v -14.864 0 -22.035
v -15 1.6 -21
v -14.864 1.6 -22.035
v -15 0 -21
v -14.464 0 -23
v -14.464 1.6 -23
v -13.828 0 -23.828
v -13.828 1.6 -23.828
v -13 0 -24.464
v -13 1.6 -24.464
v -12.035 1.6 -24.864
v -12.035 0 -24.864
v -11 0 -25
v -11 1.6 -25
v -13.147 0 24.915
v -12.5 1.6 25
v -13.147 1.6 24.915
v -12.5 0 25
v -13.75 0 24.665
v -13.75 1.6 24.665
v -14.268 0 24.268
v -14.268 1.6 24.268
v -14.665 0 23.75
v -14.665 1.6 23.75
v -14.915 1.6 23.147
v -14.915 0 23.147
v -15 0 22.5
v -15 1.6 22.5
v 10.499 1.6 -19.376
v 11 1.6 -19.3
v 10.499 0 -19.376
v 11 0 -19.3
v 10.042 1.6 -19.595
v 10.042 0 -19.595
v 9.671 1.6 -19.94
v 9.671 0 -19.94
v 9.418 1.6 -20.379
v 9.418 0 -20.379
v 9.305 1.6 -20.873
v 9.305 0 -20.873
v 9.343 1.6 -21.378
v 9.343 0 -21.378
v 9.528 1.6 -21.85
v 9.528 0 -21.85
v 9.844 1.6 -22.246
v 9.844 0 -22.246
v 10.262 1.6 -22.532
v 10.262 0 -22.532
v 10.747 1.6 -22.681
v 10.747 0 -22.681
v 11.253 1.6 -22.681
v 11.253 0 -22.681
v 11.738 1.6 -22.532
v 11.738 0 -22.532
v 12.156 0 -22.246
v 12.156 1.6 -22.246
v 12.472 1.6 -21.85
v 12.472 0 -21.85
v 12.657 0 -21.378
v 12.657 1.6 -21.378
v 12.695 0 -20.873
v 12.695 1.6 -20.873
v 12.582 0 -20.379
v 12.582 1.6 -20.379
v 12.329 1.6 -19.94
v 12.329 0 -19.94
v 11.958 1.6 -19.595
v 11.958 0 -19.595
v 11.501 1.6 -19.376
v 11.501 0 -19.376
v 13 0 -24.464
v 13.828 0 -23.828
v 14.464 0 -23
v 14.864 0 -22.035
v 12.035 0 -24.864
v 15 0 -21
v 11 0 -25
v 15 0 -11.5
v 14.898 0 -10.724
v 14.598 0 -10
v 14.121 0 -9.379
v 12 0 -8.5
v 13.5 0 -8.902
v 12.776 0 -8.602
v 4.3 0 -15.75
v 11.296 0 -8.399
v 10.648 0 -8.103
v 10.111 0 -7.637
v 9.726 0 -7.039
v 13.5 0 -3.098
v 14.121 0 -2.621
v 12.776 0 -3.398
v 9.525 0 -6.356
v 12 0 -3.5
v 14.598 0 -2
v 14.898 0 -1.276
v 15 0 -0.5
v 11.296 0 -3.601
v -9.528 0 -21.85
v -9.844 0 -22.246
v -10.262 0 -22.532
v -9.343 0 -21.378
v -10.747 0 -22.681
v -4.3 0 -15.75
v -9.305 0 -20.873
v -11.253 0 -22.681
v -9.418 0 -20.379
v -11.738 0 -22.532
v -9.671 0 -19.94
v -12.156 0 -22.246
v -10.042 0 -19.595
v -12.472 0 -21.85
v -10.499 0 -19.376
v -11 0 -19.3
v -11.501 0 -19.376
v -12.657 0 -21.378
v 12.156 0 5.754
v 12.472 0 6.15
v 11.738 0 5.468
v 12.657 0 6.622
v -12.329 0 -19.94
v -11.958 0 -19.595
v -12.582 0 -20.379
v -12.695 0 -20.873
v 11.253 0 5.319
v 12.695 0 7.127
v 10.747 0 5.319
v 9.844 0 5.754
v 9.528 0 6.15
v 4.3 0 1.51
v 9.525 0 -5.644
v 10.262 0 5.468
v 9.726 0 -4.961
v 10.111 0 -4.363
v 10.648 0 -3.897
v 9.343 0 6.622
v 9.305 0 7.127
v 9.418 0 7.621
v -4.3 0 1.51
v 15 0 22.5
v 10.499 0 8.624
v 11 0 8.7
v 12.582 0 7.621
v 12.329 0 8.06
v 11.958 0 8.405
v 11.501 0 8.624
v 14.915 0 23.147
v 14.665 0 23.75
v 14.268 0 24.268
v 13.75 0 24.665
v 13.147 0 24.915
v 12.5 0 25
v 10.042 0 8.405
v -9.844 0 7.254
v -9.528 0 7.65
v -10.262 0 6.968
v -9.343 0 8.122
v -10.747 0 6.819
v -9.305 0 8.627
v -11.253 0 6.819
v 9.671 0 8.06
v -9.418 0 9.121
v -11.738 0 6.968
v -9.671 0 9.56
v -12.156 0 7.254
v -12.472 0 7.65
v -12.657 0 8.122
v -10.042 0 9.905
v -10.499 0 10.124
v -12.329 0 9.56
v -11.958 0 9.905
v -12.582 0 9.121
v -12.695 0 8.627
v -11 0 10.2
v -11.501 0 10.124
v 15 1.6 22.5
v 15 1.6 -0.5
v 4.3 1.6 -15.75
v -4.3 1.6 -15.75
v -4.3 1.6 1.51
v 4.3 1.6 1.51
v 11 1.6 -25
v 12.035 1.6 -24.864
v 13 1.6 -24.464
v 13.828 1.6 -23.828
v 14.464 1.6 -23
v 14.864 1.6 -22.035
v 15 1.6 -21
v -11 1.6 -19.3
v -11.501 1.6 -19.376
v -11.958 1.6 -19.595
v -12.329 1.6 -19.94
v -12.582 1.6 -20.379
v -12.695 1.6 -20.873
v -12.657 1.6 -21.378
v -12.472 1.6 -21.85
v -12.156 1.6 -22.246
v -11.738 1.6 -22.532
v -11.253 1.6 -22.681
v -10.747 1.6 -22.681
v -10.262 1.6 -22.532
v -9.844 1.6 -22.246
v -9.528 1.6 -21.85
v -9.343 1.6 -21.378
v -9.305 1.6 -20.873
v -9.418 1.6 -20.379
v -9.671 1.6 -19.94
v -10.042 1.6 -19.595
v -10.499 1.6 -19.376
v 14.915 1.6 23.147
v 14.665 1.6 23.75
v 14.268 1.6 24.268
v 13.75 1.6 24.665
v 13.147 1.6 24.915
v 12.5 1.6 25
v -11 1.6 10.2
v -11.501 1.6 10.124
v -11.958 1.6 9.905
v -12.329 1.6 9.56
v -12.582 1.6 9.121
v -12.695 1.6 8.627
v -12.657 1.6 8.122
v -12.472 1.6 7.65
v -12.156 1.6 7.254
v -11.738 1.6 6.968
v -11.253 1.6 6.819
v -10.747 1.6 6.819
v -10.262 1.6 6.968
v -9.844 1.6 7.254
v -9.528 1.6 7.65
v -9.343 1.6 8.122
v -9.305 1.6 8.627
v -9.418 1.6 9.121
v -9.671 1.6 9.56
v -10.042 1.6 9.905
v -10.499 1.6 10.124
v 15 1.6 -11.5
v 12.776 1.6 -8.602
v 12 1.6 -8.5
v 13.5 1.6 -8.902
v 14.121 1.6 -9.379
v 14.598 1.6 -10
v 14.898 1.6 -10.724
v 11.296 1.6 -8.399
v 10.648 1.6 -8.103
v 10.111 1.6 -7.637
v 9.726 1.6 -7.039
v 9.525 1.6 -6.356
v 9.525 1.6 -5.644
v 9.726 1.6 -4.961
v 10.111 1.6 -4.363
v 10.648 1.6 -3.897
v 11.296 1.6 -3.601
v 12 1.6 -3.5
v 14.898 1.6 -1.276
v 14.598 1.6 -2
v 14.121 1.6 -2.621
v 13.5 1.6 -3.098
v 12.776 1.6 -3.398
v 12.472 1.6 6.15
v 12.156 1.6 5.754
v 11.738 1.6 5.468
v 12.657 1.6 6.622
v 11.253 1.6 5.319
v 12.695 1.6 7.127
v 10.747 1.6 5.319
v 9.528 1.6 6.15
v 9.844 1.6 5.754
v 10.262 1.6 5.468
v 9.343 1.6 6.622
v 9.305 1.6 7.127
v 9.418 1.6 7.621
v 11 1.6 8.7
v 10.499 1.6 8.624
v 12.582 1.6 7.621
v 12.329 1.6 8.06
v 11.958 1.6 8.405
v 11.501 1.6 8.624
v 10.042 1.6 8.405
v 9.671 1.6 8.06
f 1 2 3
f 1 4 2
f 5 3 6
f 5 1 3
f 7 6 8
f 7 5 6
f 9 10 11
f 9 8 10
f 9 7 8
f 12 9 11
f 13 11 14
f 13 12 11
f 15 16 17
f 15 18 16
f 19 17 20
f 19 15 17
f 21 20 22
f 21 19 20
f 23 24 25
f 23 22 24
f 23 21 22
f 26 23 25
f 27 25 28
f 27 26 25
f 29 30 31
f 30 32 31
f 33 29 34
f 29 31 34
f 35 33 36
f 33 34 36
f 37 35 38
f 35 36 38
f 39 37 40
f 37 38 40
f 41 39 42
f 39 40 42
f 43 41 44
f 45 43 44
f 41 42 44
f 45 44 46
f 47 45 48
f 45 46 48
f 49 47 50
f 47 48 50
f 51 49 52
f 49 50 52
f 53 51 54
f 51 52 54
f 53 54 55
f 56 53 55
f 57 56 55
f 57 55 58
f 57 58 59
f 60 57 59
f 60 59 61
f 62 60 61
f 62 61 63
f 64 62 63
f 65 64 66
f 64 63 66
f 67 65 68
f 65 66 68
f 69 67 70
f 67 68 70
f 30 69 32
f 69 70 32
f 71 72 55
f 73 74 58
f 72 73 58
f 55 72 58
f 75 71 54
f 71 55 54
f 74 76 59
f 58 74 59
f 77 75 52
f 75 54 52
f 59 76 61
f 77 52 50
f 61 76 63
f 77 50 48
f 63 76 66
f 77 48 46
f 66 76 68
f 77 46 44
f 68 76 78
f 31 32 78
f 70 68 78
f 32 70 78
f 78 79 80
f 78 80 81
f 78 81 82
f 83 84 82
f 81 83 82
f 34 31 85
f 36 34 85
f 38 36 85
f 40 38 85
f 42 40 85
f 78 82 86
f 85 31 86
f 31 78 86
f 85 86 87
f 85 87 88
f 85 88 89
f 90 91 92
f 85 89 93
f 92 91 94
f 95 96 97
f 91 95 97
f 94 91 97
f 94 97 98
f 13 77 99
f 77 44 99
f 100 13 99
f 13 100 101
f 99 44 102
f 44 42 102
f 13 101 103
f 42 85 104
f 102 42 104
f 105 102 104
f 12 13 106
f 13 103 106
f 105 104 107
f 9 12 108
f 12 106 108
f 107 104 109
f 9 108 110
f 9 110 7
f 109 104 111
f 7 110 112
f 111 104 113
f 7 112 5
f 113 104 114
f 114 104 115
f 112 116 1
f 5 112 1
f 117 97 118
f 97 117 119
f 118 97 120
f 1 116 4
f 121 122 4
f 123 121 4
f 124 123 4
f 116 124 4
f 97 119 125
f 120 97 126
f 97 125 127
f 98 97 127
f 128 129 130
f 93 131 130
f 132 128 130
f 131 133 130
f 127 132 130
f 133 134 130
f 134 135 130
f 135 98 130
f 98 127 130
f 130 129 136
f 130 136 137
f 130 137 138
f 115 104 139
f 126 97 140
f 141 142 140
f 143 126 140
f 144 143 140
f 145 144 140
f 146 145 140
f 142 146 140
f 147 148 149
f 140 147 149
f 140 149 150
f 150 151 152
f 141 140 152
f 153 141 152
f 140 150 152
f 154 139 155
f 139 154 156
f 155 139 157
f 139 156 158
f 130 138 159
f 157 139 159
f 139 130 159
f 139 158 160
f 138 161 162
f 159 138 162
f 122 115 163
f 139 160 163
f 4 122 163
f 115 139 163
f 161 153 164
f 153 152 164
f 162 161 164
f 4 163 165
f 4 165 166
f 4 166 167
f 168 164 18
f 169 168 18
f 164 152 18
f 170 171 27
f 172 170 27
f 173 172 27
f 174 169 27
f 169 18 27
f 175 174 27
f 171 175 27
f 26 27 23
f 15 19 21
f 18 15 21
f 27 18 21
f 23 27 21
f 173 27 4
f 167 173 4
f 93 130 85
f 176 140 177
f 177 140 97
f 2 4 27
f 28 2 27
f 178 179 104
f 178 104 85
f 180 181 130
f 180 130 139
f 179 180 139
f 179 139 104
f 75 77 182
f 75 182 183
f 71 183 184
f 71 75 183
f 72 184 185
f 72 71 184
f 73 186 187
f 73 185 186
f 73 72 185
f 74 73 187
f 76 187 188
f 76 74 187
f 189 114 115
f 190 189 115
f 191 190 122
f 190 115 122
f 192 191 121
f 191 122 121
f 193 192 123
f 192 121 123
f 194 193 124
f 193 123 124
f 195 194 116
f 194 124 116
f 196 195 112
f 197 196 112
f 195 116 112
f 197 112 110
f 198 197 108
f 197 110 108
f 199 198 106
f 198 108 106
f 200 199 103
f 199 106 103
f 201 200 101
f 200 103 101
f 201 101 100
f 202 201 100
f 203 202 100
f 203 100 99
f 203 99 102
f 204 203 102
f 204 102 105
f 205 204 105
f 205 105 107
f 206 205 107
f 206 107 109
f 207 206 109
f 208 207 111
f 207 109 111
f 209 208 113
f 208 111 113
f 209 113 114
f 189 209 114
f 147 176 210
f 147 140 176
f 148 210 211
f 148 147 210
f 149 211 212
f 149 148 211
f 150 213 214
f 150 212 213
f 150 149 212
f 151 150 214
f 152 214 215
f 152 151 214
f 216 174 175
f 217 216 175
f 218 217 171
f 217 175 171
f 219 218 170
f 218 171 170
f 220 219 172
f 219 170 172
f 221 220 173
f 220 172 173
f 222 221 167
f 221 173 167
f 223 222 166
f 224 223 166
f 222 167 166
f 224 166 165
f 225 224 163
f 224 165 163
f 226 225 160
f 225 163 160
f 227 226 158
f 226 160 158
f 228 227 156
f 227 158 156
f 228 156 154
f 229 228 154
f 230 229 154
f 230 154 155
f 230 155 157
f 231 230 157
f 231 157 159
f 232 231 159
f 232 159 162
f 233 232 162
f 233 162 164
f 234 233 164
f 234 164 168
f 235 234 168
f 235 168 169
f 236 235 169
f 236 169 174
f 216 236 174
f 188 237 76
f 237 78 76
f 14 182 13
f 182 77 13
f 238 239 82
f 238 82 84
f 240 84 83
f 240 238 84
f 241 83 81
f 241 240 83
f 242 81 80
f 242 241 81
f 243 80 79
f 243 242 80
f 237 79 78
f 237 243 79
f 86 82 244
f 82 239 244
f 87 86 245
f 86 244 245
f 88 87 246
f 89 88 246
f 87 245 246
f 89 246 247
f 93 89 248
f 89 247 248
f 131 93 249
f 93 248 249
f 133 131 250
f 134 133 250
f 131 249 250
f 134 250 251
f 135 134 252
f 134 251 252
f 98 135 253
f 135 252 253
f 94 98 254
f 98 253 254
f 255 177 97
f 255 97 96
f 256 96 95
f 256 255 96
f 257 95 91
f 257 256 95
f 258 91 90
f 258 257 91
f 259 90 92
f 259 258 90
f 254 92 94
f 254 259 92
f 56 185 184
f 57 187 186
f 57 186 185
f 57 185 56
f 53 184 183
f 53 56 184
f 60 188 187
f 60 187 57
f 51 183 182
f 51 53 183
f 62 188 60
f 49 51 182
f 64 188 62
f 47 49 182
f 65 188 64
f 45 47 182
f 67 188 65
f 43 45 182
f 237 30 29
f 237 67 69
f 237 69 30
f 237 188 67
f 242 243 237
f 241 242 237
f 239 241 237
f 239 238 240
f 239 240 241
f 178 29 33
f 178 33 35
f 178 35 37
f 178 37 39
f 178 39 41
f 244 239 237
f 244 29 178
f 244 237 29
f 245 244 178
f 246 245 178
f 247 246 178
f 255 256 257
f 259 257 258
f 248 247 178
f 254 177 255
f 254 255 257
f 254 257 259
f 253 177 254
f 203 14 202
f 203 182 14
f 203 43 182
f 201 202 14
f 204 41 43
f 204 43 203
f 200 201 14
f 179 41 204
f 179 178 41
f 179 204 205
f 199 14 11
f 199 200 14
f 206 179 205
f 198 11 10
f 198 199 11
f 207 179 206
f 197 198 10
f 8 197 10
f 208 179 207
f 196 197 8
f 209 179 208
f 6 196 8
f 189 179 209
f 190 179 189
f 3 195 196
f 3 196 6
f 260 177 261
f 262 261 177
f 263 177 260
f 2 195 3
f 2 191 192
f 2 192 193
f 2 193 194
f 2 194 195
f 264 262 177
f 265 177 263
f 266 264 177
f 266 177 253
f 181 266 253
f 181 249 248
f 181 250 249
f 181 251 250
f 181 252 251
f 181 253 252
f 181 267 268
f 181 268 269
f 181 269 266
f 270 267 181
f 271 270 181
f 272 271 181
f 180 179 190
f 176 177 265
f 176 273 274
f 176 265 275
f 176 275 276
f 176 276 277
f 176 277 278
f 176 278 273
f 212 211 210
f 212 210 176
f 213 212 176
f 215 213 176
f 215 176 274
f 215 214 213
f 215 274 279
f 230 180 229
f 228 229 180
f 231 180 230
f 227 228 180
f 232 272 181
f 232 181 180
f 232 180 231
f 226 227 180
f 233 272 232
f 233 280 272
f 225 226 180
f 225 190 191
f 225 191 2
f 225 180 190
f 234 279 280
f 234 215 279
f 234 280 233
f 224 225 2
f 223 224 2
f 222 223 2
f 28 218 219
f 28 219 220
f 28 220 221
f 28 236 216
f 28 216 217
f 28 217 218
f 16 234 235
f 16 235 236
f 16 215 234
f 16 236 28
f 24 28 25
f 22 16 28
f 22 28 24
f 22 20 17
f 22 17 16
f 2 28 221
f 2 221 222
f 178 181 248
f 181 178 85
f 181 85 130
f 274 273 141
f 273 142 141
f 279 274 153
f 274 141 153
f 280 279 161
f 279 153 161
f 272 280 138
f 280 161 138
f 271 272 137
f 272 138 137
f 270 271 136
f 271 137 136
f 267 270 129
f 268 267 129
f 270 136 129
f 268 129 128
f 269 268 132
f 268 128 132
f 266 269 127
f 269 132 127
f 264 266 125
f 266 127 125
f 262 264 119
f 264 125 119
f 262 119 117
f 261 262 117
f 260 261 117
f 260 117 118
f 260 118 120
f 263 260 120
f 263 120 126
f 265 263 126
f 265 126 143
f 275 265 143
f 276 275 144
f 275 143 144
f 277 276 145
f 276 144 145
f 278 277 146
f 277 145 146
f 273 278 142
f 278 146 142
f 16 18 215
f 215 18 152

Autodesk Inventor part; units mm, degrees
ref_plane "YZ Plane" through (0, 0, 0) normal (1, 0, 0) x (0, 1, 0)
ref_plane "XZ Plane" through (0, 0, 0) normal (0, 1, 0) x (-1, 0, 0)
ref_plane "XY Plane" through (0, 0, 0) normal (0, 0, 1) x (1, 0, 0)
sketch "Sketch1" plane through (0, 0, 0) normal (0, 1, 0) x (-1, 0, 0)
  line L0 (12.5, 25) -> (-12.5, 25)
  line L1 (-11, -25) -> (11, -25)
  line L2 (15, -21) -> (15, 22.5)
  line L3 (22.1598, 0) -> (-22.1598, 0) construction
  line L4 (0, -36.0977) -> (0, 35.787) construction
  arc A0 (-15, -21) -> (-11, -25) centre (-11, -21) ccw
  arc A1 (11, -25) -> (15, -21) centre (11, -21) ccw
  arc A2 (-12.5, 25) -> (-15, 22.5) centre (-12.5, 22.5) ccw
  arc A3 (15, 22.5) -> (12.5, 25) centre (12.5, 22.5) ccw
  line L5 (-15, 22.5) -> (-15, -21)
  point P0 (0, 0)
  point P1 (15, 25)
  point P2 (-15, -25)
  point P3 (-15, 25)
  point P4 (15, -25)
  point P5 (-15, 0)
  dimension "d6" = 15
  dimension "d10" = 4
  dimension "d11" = 2.5
  dimension "d15" = 15
  dimension "d35" = 50
extrude "Extrusion1" add sketch "Sketch1" along normal blind 1.6
sketch "Sketch2" plane through (0, 1.6, 0) normal (0, 1, 0) x (1, 0, 0)
  line L0 (15, -22.5) -> (15, 21) projected
  line L1 (-15, 21) -> (-15, -22.5) projected
  line L2 (-12.5, -25) -> (12.5, -25) projected
  arc A0 (15, 21) -> (11, 25) centre (11, 21) ccw projected
  arc A1 (-11, 25) -> (-15, 21) centre (-11, 21) ccw projected
  point P0 (0, 0)
  point P1 (-11, -8.5)
  point P2 (11, -7)
  dimension "d36" = 28
  dimension "d37" = 1.5
hole "Hole1" at (11, 1.6, -21) at (-11, 1.6, -21) at (-11, 1.6, 8.5) at (11, 1.6, 7) direction (0, -1, 0) diameter 3.4 end through all
sketch "Sketch3" plane through (0, 1.6, 0) normal (0, 1, 0) x (1, 0, 0)
  line L0 (4.3, -1.51) -> (-4.3, -1.51)
  line L1 (-4.3, -1.51) -> (-4.3, 15.75)
  line L2 (-4.3, 15.75) -> (4.3, 15.75)
  line L3 (4.3, 15.75) -> (4.3, -1.51)
  line L4 (0, 35) -> (0, -35) construction
  line L5 (11, 25) -> (-11, 25) projected
  point P0 (0, 0)
  dimension "d29" = 9.25
  dimension "d30" = 8.6
  dimension "d31" = 17.26
extrude "Extrusion2" cut sketch "Sketch3" against normal through all
sketch "Sketch5" plane through (0, 1.6, 0) normal (0, 1, 0) x (1, 0, 0)
  line L0 (15, -22.5) -> (15, 21) projected
  arc A0 (12, 8.5) -> (12, 3.5) centre (12, 6) ccw
  line L1 (11, 25) -> (-11, 25) projected
  arc A1 (15, 0.5) -> (12, 3.5) centre (12, 0.5) ccw
  arc A2 (12, 8.5) -> (15, 11.5) centre (12, 11.5) ccw
  point P0 (0, 0)
  dimension "d47" = 5
  dimension "d48" = 3
  dimension "d49" = 19
extrude "Extrusion3" cut sketch "Sketch5" against normal through all
properties part number "sensor_pcb"
